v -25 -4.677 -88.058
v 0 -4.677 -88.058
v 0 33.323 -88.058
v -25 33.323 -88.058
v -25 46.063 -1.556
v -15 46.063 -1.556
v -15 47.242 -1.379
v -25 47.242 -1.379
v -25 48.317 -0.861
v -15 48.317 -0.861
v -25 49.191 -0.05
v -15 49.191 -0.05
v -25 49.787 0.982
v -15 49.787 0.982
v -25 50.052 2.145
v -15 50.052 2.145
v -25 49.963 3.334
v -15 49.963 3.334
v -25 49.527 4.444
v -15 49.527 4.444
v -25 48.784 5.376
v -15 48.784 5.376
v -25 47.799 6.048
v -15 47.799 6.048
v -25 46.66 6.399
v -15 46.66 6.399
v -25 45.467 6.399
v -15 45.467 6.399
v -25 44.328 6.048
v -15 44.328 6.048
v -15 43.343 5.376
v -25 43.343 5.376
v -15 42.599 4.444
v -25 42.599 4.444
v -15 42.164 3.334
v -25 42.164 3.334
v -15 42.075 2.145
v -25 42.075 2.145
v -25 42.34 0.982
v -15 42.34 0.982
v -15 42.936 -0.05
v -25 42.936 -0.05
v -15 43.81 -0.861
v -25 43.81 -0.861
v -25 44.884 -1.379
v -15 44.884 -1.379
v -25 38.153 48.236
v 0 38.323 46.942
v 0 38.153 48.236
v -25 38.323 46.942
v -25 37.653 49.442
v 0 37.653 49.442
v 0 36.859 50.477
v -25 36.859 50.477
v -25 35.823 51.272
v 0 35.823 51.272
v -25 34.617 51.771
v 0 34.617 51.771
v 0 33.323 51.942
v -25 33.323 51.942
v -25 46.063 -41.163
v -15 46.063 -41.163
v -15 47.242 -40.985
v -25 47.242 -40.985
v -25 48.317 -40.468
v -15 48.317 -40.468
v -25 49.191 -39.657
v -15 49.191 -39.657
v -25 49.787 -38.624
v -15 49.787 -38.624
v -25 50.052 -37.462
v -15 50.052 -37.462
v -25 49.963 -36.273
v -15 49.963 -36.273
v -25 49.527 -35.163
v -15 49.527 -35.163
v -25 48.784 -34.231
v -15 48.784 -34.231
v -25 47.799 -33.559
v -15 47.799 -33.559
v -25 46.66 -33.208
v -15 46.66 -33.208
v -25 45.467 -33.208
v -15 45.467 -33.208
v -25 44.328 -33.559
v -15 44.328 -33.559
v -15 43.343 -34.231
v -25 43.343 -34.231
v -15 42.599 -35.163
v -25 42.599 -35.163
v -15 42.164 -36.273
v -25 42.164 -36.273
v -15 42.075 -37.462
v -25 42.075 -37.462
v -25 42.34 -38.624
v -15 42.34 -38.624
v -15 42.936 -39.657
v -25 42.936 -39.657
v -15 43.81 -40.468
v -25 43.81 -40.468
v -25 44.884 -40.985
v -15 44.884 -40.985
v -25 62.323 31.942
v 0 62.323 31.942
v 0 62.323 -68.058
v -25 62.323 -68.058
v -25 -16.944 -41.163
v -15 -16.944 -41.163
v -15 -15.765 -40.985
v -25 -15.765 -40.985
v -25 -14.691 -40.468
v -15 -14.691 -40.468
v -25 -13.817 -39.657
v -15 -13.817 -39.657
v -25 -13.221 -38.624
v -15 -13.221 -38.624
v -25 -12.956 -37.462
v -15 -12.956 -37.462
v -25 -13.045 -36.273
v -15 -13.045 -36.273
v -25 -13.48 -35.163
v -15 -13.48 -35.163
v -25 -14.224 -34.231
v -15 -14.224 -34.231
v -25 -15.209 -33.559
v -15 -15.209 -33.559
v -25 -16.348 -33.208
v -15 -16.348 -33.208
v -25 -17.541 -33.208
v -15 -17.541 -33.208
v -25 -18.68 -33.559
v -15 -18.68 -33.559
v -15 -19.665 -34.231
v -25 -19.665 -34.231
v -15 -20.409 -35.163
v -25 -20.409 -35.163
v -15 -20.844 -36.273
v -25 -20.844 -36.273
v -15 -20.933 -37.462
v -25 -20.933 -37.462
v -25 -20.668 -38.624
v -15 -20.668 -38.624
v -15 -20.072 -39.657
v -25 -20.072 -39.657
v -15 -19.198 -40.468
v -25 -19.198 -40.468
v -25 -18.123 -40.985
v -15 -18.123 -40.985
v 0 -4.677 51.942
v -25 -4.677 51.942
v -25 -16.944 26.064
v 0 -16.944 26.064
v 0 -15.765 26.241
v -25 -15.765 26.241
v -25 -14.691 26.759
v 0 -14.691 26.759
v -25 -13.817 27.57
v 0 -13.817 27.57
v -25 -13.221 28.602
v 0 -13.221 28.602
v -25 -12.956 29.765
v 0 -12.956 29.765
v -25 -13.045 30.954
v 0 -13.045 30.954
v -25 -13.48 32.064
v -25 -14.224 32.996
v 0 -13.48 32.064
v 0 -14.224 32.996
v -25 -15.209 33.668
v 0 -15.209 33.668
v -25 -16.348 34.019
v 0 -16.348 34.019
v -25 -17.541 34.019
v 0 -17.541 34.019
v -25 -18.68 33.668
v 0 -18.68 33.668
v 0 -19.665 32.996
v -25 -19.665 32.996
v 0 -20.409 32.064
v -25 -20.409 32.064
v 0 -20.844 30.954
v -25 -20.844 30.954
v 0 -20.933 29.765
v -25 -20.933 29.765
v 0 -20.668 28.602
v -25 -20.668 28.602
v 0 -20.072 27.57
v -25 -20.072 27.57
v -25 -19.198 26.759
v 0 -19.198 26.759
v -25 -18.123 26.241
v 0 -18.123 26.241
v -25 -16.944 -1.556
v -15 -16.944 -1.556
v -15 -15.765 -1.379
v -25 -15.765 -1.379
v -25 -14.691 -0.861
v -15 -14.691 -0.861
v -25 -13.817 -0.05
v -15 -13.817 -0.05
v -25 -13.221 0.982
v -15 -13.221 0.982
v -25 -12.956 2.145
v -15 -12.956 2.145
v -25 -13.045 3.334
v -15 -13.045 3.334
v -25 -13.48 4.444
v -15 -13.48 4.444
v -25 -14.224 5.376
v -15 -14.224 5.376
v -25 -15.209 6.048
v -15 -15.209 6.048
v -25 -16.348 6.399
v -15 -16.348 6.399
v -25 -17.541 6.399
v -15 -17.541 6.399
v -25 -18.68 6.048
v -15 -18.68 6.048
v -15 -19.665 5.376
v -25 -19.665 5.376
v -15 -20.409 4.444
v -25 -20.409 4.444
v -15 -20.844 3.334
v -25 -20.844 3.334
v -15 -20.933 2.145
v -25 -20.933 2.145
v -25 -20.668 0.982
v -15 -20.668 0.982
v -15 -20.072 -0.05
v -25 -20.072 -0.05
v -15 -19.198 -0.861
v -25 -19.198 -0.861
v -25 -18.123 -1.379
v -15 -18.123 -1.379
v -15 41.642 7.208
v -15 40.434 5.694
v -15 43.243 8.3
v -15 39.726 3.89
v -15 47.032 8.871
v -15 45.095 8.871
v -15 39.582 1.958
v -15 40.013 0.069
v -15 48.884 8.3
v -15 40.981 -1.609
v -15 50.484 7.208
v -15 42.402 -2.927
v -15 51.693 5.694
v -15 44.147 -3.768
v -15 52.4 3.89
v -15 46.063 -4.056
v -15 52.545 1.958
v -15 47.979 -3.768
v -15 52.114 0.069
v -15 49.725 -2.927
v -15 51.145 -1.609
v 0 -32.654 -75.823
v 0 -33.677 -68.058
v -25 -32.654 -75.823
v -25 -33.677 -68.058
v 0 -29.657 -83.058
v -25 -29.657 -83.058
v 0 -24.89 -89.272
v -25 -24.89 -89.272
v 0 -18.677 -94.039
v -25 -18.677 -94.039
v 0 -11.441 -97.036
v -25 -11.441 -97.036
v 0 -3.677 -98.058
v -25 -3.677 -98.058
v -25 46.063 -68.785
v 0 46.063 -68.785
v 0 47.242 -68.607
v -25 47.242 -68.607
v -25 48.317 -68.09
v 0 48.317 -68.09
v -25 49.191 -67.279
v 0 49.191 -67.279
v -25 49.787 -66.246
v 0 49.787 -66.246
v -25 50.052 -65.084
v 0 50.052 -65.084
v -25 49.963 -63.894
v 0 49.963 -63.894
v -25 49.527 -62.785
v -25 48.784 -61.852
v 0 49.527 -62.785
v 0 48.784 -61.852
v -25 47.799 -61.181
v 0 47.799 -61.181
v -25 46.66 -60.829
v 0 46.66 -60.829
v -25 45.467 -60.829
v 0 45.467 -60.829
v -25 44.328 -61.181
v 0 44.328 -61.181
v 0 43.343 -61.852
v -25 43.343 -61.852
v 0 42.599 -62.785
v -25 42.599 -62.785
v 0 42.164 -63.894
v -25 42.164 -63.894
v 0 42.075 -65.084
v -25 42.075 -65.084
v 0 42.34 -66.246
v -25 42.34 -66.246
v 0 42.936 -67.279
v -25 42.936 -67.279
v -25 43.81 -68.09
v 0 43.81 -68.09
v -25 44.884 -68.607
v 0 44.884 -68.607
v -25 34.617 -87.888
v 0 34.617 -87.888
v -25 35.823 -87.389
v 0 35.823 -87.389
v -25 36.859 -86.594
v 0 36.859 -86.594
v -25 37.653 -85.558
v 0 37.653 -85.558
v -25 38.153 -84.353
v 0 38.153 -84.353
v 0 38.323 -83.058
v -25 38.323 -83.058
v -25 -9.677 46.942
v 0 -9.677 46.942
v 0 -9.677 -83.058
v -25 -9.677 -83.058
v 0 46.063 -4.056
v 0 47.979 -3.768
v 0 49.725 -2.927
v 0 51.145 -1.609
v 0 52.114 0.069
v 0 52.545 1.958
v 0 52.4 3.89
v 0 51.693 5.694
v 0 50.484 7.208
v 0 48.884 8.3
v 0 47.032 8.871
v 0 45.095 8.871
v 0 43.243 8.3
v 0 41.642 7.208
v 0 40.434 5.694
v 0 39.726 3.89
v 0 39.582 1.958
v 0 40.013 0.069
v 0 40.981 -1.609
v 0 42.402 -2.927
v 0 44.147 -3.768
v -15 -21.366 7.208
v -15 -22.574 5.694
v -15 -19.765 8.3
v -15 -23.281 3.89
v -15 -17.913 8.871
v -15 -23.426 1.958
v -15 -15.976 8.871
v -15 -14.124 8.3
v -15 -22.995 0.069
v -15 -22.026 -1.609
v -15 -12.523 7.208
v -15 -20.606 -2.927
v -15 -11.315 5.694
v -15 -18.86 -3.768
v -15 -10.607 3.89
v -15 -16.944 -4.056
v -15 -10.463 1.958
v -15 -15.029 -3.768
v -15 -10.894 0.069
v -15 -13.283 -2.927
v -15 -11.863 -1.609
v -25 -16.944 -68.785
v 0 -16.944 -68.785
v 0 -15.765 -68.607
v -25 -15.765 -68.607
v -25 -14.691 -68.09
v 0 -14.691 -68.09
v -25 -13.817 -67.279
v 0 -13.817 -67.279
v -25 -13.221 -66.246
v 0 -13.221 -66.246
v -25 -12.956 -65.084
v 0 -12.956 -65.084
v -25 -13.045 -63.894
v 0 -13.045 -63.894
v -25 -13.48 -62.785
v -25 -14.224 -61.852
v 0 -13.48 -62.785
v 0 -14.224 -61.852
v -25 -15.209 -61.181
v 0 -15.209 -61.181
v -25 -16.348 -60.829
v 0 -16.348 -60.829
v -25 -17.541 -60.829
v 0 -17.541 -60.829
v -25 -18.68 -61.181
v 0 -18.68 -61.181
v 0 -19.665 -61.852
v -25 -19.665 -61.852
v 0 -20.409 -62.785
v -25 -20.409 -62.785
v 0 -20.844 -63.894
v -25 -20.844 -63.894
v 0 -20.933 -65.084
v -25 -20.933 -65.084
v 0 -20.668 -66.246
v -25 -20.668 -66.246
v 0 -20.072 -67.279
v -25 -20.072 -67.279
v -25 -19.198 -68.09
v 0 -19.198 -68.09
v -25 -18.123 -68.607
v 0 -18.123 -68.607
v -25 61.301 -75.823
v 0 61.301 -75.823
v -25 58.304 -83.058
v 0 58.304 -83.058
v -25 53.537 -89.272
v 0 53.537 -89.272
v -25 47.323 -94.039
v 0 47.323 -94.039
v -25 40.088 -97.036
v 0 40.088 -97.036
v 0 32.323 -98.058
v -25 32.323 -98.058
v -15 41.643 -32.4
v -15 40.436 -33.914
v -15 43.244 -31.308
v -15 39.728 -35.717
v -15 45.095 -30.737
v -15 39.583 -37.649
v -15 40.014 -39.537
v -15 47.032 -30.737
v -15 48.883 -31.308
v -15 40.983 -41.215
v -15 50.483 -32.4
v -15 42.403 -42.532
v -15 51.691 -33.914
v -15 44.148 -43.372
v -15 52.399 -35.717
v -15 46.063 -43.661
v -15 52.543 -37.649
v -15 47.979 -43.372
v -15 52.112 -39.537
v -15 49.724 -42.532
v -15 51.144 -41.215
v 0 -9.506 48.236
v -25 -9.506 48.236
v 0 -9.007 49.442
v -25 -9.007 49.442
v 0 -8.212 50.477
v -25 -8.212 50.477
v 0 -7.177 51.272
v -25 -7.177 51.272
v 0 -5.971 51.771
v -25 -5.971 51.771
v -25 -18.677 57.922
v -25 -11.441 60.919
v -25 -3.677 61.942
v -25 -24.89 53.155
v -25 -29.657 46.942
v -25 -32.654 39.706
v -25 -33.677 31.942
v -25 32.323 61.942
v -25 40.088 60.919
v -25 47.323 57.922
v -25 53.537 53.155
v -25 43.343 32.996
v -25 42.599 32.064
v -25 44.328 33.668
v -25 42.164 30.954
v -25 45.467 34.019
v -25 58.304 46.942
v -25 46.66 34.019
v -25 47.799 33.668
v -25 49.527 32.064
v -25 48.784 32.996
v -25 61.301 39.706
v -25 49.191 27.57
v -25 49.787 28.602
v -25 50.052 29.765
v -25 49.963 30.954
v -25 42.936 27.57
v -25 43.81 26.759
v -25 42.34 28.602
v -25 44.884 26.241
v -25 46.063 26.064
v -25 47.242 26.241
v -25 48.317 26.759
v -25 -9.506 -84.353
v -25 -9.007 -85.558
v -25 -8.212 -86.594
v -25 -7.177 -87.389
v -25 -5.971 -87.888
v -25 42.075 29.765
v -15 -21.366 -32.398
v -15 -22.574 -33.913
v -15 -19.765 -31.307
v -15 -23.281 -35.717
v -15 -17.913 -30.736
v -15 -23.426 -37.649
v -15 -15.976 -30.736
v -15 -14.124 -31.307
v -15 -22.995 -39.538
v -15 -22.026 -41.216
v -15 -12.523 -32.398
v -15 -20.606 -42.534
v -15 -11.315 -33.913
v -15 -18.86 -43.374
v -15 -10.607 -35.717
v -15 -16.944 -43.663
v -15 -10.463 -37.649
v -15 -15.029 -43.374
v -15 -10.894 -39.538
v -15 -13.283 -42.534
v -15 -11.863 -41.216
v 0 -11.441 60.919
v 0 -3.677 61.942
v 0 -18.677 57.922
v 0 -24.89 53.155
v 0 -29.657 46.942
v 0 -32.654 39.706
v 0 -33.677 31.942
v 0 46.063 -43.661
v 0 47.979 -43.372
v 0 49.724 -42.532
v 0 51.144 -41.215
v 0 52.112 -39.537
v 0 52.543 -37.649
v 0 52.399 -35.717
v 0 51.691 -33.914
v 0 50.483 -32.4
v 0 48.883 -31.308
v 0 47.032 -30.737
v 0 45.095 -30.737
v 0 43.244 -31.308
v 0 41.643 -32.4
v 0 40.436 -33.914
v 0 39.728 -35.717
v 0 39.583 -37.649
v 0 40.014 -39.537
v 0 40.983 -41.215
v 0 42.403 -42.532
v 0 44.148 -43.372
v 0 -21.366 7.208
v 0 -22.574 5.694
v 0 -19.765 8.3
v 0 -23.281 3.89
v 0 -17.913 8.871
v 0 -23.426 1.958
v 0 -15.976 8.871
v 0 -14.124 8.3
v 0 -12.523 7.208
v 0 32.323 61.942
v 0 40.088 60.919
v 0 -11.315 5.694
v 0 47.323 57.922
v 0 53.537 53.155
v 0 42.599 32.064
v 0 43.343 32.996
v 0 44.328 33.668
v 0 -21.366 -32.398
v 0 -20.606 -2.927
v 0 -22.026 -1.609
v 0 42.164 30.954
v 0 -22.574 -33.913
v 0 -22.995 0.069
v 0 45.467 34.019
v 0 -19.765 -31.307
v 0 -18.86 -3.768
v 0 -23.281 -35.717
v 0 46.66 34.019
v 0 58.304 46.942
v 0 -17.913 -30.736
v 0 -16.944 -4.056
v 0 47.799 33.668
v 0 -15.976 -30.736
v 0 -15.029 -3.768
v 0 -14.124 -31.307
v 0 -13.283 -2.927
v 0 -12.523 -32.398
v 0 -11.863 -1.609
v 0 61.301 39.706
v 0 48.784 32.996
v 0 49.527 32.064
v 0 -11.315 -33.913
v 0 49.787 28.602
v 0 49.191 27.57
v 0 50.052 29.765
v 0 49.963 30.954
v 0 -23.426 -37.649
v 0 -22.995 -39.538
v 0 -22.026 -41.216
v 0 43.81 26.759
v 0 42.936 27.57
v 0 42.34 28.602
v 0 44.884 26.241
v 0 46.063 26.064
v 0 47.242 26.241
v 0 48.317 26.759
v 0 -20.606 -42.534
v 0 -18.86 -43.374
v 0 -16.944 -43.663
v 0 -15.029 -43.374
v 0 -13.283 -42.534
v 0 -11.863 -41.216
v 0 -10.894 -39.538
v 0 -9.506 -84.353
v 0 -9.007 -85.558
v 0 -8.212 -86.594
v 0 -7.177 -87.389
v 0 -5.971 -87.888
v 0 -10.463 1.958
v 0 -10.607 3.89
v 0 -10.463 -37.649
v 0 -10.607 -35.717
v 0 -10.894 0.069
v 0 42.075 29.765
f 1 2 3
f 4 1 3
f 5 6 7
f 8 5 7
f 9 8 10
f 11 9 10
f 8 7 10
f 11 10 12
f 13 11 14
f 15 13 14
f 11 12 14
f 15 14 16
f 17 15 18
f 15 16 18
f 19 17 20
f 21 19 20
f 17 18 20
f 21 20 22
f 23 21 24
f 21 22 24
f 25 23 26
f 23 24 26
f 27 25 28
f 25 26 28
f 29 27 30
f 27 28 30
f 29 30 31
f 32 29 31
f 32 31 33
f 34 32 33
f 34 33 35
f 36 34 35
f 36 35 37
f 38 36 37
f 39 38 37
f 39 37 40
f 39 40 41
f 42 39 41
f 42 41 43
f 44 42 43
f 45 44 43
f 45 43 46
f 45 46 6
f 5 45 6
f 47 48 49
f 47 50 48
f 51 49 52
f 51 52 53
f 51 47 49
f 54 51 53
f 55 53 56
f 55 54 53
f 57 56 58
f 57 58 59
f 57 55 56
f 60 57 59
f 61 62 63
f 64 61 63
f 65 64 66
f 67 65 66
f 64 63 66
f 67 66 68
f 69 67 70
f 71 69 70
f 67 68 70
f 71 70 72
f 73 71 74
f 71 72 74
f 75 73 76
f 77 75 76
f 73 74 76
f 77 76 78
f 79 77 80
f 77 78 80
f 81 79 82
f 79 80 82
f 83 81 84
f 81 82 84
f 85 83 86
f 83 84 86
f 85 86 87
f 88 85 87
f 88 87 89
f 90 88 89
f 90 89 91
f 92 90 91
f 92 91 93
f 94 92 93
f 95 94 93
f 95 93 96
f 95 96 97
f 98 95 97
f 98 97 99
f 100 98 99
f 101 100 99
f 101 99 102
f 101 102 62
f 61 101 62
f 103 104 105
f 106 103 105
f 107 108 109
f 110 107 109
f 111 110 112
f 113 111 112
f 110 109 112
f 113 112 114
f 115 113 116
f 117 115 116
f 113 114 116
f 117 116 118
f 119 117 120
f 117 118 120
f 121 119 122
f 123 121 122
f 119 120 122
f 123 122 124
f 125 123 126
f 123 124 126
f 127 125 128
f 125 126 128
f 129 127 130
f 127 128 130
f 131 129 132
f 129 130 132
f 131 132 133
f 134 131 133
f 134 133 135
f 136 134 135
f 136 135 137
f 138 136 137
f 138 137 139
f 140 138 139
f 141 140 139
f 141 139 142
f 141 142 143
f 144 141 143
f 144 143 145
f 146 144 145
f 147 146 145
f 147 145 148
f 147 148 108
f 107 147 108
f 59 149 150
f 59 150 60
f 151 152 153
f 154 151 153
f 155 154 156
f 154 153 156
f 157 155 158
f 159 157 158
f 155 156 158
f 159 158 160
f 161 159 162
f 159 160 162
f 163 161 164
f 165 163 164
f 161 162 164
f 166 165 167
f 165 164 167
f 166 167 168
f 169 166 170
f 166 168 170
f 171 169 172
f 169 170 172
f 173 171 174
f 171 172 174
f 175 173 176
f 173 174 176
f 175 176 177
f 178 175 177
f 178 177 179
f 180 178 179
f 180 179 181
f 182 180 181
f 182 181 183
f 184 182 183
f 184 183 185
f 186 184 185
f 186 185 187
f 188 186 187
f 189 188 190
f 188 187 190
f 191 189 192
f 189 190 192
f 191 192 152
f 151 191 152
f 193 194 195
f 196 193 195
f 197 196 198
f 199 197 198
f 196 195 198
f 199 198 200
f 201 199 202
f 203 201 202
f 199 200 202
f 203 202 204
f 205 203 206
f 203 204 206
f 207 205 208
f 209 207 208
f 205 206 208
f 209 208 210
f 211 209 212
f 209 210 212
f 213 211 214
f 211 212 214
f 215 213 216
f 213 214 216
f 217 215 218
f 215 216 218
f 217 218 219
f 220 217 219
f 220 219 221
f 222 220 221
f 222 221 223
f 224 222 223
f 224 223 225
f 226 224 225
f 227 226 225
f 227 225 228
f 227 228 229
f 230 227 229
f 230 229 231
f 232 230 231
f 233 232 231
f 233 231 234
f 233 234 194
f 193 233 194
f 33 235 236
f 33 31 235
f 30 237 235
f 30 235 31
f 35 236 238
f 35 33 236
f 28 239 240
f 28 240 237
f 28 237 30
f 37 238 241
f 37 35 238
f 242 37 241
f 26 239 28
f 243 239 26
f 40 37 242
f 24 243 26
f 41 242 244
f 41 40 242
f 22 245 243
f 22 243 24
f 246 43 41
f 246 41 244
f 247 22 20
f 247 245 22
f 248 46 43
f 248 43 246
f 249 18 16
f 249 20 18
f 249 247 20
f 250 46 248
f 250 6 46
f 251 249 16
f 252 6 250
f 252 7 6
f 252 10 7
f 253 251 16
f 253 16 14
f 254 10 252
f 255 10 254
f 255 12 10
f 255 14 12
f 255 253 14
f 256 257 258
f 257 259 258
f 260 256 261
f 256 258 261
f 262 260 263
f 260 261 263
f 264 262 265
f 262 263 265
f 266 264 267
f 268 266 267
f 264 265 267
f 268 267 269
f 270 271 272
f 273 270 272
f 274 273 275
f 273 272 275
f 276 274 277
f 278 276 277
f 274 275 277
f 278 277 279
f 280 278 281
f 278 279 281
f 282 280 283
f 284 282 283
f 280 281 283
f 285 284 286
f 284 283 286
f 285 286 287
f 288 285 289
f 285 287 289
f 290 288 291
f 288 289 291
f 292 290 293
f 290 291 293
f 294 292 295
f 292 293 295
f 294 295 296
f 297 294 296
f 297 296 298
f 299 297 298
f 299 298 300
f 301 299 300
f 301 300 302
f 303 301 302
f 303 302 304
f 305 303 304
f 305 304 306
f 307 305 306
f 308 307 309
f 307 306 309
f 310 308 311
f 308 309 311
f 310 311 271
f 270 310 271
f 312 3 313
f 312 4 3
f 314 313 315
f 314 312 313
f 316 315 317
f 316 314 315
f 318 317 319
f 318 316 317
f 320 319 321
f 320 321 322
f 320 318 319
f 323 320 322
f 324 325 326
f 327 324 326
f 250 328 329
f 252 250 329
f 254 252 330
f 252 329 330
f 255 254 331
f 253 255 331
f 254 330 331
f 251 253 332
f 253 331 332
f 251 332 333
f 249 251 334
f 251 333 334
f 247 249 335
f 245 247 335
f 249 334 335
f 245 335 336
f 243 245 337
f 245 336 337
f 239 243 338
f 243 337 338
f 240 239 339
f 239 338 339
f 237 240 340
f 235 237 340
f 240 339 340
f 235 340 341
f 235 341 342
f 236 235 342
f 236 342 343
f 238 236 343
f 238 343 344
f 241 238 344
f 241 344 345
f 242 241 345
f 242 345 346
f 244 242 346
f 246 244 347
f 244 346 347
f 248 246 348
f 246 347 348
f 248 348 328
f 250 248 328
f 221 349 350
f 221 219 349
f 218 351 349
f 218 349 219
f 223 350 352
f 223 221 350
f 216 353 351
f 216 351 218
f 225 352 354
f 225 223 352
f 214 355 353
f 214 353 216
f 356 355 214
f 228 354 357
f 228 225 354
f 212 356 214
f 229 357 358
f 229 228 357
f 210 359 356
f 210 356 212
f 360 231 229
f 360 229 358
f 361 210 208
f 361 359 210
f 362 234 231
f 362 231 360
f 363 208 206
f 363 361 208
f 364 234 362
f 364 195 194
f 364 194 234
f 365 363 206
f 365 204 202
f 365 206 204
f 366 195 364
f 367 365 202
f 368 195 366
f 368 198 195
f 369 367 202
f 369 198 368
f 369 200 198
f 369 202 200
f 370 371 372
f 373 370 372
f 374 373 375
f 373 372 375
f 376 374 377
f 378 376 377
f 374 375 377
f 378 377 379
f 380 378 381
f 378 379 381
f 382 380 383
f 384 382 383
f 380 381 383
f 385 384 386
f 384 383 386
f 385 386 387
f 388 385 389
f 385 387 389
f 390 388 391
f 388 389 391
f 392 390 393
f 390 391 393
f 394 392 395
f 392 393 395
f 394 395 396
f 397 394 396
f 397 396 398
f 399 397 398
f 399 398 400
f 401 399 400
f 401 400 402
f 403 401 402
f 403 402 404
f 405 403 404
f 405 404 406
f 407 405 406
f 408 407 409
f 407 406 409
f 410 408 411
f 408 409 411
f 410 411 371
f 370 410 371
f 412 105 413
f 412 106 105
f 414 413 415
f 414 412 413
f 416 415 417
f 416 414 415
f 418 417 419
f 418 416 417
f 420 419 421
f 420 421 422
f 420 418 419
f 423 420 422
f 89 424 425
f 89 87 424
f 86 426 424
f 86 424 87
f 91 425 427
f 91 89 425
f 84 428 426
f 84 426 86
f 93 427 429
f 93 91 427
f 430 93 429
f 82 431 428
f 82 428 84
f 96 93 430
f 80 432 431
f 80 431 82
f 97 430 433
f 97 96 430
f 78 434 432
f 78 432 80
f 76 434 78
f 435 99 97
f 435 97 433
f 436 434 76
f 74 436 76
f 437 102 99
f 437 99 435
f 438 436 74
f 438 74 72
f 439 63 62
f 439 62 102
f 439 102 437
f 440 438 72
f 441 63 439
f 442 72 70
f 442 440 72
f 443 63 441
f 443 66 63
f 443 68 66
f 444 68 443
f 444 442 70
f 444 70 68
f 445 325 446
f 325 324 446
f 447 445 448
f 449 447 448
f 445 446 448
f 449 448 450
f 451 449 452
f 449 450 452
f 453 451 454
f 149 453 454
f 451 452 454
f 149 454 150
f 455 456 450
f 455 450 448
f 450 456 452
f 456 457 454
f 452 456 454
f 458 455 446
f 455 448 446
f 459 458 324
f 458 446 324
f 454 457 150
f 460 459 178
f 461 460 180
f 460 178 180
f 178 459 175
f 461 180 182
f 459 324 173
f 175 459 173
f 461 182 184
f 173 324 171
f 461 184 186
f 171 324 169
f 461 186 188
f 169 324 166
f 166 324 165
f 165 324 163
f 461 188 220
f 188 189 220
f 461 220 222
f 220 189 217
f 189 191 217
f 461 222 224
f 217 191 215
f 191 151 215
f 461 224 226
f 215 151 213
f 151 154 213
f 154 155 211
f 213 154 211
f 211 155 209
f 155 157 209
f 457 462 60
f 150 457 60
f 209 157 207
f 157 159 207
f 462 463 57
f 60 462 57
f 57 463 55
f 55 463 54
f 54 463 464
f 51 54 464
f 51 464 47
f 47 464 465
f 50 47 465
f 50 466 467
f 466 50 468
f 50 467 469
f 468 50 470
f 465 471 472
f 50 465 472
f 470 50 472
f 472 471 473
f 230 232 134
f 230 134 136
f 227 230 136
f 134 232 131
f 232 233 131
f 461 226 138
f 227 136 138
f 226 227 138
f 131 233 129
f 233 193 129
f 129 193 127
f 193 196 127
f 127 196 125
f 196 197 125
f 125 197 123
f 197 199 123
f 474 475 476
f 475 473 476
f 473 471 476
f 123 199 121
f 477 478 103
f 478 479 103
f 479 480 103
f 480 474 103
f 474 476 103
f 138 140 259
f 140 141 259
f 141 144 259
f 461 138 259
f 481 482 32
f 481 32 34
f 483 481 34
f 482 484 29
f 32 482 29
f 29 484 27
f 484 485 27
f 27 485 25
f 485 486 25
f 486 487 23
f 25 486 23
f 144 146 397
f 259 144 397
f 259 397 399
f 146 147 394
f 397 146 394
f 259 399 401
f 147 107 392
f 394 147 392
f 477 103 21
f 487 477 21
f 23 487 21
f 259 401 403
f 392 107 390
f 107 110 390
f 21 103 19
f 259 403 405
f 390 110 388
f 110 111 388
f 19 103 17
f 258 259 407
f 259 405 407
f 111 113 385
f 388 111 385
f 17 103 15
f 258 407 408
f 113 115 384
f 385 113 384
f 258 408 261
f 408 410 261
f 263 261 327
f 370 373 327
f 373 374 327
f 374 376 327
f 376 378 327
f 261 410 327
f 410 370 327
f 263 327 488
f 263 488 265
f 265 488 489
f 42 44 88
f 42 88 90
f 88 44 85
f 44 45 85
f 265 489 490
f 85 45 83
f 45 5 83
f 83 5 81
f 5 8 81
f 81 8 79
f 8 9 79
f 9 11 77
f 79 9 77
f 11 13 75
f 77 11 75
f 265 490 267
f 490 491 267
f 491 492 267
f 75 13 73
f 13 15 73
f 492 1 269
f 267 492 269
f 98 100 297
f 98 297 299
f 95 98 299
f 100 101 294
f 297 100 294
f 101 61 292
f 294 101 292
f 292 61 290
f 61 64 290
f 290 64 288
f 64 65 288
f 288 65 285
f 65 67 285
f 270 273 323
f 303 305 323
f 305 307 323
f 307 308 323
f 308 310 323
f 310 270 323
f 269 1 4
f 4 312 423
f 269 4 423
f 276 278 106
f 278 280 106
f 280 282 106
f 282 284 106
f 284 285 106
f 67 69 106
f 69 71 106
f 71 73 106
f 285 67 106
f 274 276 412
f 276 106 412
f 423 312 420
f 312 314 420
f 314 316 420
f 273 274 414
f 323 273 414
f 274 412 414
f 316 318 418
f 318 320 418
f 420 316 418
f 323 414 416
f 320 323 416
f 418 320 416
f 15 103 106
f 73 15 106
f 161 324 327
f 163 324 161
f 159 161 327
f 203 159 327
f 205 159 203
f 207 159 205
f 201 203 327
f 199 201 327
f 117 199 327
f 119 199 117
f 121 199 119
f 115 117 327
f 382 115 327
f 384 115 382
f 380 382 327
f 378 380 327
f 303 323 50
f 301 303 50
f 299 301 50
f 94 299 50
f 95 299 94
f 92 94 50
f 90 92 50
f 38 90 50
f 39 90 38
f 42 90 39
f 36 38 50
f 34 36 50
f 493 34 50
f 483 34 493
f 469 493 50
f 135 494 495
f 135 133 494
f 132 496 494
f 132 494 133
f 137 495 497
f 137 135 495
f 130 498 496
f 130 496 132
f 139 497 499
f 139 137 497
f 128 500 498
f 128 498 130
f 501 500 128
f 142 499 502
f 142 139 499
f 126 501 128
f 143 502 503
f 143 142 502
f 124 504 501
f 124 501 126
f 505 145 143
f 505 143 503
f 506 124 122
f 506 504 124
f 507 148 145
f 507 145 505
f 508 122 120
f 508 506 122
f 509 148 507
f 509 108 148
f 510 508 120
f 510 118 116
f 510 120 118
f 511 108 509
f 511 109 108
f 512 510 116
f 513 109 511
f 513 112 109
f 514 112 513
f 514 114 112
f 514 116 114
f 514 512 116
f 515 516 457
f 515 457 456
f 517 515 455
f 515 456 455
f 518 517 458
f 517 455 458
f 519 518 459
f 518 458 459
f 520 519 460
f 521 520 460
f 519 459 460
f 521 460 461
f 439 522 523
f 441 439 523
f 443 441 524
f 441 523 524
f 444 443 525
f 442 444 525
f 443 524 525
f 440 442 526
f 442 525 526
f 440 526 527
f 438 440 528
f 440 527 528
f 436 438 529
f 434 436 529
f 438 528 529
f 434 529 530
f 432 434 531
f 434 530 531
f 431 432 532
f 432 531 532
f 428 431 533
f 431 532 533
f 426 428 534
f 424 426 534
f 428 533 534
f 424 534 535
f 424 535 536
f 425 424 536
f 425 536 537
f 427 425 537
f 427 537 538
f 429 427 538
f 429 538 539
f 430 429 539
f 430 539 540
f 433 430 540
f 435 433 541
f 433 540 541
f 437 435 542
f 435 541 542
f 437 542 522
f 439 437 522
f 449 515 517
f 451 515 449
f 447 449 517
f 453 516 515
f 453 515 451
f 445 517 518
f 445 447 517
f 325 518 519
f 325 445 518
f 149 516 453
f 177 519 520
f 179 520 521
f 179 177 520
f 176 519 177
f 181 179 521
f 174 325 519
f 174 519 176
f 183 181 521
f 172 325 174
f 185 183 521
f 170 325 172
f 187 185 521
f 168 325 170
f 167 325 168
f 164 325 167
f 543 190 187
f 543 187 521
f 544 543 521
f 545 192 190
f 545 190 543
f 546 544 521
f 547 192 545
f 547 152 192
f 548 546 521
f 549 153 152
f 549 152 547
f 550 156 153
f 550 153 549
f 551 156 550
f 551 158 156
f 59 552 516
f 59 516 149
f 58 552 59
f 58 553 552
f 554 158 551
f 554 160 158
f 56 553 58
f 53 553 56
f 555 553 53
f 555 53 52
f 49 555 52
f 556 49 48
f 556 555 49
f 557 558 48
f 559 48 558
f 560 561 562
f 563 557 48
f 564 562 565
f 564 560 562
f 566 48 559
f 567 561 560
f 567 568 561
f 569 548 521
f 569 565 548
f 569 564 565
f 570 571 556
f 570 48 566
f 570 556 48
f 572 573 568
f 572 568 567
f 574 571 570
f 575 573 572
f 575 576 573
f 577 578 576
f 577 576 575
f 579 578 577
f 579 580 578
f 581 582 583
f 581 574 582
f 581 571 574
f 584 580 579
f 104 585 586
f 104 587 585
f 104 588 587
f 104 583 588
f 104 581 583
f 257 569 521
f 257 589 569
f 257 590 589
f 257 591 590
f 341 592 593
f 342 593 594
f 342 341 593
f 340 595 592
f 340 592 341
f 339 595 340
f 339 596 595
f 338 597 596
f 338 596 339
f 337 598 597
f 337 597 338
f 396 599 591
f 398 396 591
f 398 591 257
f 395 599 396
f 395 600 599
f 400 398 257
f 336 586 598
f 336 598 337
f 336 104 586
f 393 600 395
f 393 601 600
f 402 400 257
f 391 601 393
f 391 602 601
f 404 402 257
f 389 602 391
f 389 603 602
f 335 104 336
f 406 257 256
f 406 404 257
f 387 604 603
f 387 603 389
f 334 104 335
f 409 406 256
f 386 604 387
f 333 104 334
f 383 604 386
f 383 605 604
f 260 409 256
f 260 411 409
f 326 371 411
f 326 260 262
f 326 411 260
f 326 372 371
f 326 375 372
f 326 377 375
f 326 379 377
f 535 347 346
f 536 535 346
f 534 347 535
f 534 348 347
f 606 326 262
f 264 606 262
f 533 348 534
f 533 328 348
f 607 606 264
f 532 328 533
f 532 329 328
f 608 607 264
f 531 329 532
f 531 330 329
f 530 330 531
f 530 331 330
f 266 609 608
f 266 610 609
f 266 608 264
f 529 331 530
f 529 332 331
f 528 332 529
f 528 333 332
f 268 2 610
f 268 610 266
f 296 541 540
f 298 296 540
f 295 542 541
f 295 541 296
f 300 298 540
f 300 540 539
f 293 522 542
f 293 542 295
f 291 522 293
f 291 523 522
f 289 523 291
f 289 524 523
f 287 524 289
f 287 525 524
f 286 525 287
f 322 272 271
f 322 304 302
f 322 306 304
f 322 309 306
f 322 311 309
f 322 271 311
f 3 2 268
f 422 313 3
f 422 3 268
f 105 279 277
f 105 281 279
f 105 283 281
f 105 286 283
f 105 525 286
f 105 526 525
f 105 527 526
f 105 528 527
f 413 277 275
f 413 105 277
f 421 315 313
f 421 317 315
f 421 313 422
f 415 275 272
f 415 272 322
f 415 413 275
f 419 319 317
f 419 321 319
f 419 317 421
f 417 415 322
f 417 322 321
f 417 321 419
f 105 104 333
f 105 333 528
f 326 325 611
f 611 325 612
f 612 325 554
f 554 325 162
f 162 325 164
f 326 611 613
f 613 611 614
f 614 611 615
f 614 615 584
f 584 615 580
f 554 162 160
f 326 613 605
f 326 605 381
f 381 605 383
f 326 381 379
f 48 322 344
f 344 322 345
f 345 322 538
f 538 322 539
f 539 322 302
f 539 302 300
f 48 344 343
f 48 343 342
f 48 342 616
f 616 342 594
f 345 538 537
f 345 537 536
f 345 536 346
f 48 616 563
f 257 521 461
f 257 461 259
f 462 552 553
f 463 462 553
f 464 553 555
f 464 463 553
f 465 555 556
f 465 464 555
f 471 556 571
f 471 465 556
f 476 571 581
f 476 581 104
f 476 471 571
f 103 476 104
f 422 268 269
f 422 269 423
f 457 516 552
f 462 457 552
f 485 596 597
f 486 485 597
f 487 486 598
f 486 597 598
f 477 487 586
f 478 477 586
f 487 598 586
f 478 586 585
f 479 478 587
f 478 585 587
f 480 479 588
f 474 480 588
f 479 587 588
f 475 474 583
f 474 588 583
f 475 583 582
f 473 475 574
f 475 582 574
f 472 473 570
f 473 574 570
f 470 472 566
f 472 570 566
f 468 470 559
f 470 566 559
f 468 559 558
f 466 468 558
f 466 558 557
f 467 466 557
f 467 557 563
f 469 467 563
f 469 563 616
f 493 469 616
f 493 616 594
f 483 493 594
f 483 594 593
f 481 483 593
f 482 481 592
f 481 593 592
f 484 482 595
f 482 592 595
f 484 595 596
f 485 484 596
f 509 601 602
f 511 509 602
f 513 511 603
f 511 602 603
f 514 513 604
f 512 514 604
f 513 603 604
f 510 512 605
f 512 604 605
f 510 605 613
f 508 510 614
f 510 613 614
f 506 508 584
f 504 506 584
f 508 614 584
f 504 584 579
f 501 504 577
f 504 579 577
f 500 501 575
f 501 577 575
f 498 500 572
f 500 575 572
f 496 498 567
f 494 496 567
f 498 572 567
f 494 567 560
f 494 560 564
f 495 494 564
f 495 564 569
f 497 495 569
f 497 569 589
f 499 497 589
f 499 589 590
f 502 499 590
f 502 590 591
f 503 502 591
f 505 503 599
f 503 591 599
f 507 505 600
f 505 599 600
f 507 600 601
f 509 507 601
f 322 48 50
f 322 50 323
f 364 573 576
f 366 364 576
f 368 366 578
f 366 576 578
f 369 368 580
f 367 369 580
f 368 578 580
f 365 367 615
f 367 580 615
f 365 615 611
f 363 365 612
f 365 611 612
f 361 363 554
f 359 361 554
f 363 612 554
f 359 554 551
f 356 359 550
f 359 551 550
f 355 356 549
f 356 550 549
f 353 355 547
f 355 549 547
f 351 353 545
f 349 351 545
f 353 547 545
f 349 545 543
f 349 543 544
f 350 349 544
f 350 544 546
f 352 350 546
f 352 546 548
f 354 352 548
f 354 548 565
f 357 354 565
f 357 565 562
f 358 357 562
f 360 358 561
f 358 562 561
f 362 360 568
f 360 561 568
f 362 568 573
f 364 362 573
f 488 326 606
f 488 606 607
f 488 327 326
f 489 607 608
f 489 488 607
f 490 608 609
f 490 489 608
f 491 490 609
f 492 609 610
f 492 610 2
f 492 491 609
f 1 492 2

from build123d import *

# Parameters (mm, degrees)
SKETCH_1_W          = 160
SKETCH_1_H          = 96
SKETCH_1_R          = 4
SKETCH_1_W_2        = 140
SKETCH_1_H_2        = 48
EXTRUDE_1_DEPTH     = 25
FILLET_1_R          = 30
FILLET_2_R          = 5
SKETCH_11_R         = 6.498169544
SKETCH_11_R_2       = 6.5
CUT_EXTRUDE_1_DEPTH = 15


with BuildPart() as part:
    # 草图1 → 凸台-拉伸1 (new body)
    with BuildSketch(Plane(origin=(0, 0, 0), x_dir=(0, 0, -1), z_dir=(1, 0, 0))):
        with Locations((18.05845234, 14.323348887)):
            Rectangle(SKETCH_1_W, SKETCH_1_H)
        with Locations((-2.443633142, 46.063348887)):
            Circle(SKETCH_1_R, mode=Mode.SUBTRACT)
        with Locations((37.163019963, 46.063348887)):
            Circle(SKETCH_1_R, mode=Mode.SUBTRACT)
        with Locations((-2.443633142, -16.944440743)):
            Circle(SKETCH_1_R, mode=Mode.SUBTRACT)
        with Locations((37.163019963, -16.944440743)):
            Circle(SKETCH_1_R, mode=Mode.SUBTRACT)
        with Locations((64.784581693, 46.063348887)):
            Circle(SKETCH_1_R, mode=Mode.SUBTRACT)
        with Locations((-30.063633142, -16.944440743)):
            Circle(SKETCH_1_R, mode=Mode.SUBTRACT)
        with Locations((64.784581693, -16.944440743)):
            Circle(SKETCH_1_R, mode=Mode.SUBTRACT)
        with Locations((-30.063633142, 46.063348887)):
            Circle(SKETCH_1_R, mode=Mode.SUBTRACT)
        with Locations((18.05845234, 14.323348887)):
            Rectangle(SKETCH_1_W_2, SKETCH_1_H_2, mode=Mode.SUBTRACT)
    extrude(amount=-EXTRUDE_1_DEPTH)

    # 圆角1
    fillet_1_edges = [part.edges().sort_by_distance(p)[0] for p in [
        (-12.5, 62.323348887, 61.94154766),
        (-12.5, 62.323348887, -98.05845234),
        (-12.5, -33.676651113, -98.05845234),
        (-12.5, -33.676651113, 61.94154766),
    ]]
    fillet(fillet_1_edges, radius=FILLET_1_R)

    # 圆角2
    fillet_2_edges = [part.edges().sort_by_distance(p)[0] for p in [
        (-12.5, -9.676651113, 51.94154766),
        (-12.5, 38.323348887, 51.94154766),
        (-12.5, 38.323348887, -88.05845234),
        (-12.5, -9.676651113, -88.05845234),
    ]]
    fillet(fillet_2_edges, radius=FILLET_2_R)

    # 草图11 → 切除-拉伸1 (cut)
    with BuildSketch(Plane(origin=(0, 0, 0), x_dir=(0, 0, -1), z_dir=(1, 0, 0))):
        with Locations((37.163019963, 46.063348887)):
            Circle(SKETCH_11_R)
        with Locations((-2.443633142, 46.063348887)):
            Circle(SKETCH_11_R_2)
        with Locations((37.163019963, -16.944440743)):
            Circle(SKETCH_11_R_2)
        with Locations((-2.443633142, -16.944440743)):
            Circle(SKETCH_11_R_2)
    extrude(amount=-CUT_EXTRUDE_1_DEPTH, mode=Mode.SUBTRACT)


solid = part.part
